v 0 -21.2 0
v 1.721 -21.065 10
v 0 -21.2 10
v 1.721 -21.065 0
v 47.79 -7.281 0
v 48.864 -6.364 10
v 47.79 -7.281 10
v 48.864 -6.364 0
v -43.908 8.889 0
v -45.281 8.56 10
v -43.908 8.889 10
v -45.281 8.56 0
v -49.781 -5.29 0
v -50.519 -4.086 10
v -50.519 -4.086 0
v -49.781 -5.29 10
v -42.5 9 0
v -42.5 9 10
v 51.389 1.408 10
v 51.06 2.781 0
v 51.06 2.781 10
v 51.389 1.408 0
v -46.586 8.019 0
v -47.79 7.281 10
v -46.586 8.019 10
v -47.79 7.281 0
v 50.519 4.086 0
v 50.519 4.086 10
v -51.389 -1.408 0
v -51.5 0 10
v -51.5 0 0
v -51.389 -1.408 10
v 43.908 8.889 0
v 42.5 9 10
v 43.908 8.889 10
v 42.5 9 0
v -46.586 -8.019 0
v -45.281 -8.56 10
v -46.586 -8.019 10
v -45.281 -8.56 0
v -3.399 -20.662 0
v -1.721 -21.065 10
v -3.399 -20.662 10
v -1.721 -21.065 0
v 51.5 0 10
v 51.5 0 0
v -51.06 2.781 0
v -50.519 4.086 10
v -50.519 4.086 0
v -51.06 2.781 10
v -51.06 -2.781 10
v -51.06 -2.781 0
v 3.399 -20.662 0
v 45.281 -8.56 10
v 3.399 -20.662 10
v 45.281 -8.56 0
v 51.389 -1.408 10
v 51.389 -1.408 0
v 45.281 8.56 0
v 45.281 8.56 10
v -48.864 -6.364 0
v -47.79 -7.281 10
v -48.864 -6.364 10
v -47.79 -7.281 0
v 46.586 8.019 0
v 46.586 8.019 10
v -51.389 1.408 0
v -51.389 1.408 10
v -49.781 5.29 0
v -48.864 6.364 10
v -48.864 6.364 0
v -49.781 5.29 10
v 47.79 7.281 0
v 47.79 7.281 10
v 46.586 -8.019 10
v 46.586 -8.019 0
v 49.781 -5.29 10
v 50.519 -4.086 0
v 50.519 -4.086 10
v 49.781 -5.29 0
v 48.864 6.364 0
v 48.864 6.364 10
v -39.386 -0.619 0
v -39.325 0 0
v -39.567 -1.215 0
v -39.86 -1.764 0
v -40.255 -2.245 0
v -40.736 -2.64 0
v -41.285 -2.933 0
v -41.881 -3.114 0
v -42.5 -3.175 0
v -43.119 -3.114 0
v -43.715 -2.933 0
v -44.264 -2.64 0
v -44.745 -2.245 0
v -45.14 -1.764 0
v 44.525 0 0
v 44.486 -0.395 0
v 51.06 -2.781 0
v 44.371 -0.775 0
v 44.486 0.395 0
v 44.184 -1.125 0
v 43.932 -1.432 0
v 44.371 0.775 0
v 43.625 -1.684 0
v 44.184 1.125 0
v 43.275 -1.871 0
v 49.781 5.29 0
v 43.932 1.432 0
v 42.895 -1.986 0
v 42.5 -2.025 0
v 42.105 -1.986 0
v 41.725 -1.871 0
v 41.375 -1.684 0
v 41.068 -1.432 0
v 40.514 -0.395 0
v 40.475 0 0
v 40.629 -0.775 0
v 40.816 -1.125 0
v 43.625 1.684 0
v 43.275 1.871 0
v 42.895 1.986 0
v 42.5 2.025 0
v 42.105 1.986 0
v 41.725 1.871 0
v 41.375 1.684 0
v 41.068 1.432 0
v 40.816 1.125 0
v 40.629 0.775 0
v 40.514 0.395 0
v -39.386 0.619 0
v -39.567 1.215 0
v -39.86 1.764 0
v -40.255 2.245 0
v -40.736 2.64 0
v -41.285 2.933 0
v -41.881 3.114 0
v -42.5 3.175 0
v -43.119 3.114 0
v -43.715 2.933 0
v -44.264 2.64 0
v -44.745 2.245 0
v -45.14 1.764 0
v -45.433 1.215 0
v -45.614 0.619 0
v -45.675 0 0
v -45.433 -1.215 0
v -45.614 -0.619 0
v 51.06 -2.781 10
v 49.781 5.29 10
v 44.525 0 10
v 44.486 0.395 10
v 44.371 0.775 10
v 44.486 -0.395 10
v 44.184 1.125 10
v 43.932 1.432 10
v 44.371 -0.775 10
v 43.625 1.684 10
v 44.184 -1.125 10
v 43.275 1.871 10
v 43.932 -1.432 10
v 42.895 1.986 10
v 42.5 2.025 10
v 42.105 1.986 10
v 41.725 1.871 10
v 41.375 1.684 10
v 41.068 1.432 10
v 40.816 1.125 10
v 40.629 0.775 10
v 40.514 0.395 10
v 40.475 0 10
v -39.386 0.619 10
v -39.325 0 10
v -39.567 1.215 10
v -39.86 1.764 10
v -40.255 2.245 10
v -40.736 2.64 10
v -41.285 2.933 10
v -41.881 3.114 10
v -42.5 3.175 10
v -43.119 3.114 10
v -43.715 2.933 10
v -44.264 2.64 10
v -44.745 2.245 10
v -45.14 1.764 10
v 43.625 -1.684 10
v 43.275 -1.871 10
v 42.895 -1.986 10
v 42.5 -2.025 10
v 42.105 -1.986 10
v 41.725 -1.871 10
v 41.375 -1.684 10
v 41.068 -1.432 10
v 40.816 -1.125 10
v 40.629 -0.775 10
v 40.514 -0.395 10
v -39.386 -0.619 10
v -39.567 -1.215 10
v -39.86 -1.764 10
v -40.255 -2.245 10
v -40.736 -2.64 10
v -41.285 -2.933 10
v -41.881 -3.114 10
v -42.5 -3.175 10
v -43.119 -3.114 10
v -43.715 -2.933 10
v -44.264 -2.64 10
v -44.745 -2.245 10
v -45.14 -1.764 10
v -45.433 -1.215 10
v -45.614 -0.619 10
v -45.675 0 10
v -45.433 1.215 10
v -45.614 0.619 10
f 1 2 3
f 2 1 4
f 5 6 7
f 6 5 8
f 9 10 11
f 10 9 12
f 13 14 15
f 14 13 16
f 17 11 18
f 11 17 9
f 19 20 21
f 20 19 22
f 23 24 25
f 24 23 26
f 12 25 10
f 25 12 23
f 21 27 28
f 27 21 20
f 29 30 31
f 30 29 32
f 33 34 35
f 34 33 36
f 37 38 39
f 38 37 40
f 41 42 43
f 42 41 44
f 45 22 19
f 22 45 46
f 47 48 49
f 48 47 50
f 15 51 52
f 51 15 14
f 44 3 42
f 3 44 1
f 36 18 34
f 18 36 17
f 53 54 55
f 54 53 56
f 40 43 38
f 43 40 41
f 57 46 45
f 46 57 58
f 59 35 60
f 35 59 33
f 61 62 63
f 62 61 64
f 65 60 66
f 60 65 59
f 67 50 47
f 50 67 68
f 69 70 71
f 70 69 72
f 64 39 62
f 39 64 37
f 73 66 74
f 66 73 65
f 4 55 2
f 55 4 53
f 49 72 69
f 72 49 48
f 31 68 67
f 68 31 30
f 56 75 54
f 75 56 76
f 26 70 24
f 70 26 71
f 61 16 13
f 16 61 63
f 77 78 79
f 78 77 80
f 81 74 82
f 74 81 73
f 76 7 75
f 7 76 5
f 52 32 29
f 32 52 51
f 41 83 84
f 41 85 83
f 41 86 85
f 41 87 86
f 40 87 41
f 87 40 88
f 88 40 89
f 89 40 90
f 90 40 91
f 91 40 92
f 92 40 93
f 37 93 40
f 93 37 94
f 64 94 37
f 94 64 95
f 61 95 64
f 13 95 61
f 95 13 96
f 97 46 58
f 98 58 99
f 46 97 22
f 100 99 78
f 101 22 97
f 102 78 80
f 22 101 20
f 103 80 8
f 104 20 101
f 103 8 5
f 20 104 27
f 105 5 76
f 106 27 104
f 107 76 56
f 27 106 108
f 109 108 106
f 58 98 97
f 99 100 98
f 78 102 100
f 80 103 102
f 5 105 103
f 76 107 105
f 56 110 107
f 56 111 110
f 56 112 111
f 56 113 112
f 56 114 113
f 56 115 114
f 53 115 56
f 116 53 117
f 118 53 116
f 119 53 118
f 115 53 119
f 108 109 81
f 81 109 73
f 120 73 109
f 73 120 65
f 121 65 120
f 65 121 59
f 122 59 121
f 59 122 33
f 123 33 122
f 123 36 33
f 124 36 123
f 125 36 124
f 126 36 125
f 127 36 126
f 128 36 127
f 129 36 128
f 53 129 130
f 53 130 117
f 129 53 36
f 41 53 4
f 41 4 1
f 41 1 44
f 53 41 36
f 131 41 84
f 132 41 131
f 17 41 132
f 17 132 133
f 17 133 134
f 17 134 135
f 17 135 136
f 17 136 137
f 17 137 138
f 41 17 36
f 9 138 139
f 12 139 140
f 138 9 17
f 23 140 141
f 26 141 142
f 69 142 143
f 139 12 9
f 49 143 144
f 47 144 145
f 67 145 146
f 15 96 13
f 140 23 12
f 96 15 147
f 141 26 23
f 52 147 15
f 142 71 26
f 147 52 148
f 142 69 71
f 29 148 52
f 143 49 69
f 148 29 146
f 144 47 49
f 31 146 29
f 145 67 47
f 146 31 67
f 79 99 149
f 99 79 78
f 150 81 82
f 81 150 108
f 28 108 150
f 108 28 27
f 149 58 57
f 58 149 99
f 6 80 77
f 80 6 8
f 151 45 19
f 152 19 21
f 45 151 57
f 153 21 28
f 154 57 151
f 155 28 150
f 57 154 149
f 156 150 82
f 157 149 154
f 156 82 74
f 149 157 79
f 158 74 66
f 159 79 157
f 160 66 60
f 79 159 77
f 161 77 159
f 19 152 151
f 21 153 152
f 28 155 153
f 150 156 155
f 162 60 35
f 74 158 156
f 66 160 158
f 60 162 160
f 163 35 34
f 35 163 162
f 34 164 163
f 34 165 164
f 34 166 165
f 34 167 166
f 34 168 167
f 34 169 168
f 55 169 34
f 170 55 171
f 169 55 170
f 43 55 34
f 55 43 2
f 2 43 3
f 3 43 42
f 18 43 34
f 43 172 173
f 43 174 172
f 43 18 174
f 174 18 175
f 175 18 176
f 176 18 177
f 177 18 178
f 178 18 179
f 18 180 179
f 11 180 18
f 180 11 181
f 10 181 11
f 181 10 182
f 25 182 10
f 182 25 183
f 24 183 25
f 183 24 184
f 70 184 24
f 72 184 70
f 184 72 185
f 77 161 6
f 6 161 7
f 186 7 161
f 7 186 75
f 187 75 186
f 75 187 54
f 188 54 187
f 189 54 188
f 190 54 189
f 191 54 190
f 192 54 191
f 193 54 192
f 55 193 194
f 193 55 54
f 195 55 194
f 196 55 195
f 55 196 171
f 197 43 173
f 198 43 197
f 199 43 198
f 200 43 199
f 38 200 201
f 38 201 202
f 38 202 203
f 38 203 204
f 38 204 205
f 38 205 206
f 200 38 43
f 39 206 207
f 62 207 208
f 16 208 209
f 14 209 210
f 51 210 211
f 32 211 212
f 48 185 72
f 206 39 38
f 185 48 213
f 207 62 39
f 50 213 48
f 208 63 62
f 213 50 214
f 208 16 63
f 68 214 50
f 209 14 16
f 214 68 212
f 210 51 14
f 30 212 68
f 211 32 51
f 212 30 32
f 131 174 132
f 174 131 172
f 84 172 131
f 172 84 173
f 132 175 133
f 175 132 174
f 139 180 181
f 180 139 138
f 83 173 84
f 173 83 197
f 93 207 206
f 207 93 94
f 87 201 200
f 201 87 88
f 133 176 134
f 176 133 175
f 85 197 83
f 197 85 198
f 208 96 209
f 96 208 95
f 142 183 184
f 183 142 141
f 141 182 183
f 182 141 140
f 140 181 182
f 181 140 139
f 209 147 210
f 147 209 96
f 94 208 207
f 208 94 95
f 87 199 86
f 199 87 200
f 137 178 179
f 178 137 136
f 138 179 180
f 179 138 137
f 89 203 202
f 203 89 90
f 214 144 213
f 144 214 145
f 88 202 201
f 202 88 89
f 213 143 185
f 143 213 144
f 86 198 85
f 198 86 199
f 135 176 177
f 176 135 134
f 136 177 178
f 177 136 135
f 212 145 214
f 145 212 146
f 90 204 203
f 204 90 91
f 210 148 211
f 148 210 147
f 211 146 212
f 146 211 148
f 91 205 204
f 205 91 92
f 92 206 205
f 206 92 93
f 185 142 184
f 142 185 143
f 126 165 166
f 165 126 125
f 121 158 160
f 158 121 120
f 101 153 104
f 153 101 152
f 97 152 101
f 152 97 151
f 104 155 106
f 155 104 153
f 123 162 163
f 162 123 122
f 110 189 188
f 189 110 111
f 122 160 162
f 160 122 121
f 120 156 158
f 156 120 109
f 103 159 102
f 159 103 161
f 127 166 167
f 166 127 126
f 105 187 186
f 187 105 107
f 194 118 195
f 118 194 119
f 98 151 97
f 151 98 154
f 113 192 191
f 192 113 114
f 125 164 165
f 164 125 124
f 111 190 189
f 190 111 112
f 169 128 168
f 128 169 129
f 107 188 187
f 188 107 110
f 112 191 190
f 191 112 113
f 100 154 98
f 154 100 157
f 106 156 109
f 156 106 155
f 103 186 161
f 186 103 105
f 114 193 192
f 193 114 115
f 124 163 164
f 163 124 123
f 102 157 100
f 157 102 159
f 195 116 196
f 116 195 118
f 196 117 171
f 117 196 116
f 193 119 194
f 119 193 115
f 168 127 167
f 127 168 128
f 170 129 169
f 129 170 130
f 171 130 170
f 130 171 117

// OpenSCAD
$fn = 32;

// ----------------------------------------------------------------------
// Lever: 85 mm between the bosses, 10 mm thick, smooth outline
// ----------------------------------------------------------------------

// --- parameters (mm) ---
lever_l = 85;             // distance between the boss centres
boss_a = 18;              // first boss diameter
boss_b = 18;              // second boss diameter
bore_a = 6.35;            // first bore
bore_b = 4.05;            // second bore
lever_t = 10;             // lever thickness
boss_c = 22;              // middle boss diameter
bend = 10.2;              // how far the middle boss drops

lever_profile = [[-51.5, 0], [-51.389, -1.408], [-51.06, -2.781], [-50.519, -4.086], [-49.781, -5.29], [-48.864, -6.364], [-47.79, -7.281], [-46.586, -8.019], [-45.281, -8.56], [-3.399, -20.662], [-1.721, -21.065], [0, -21.2], [1.721, -21.065], [3.399, -20.662], [45.281, -8.56], [46.586, -8.019], [47.79, -7.281], [48.864, -6.364], [49.781, -5.29], [50.519, -4.086], [51.06, -2.781], [51.389, -1.408], [51.5, 0], [51.389, 1.408], [51.06, 2.781], [50.519, 4.086], [49.781, 5.29], [48.864, 6.364], [47.79, 7.281], [46.586, 8.019], [45.281, 8.56], [43.908, 8.889], [42.5, 9], [-42.5, 9], [-43.908, 8.889], [-45.281, 8.56], [-46.586, 8.019], [-47.79, 7.281], [-48.864, 6.364], [-49.781, 5.29], [-50.519, 4.086], [-51.06, 2.781], [-51.389, 1.408]];

difference() {
  linear_extrude(height = lever_t) polygon(lever_profile);
  translate([-42.5, 0, -2.5]) cylinder(h = lever_t + 5, d = bore_a);
  translate([42.5, 0, -2.5]) cylinder(h = lever_t + 5, d = bore_b);
}
